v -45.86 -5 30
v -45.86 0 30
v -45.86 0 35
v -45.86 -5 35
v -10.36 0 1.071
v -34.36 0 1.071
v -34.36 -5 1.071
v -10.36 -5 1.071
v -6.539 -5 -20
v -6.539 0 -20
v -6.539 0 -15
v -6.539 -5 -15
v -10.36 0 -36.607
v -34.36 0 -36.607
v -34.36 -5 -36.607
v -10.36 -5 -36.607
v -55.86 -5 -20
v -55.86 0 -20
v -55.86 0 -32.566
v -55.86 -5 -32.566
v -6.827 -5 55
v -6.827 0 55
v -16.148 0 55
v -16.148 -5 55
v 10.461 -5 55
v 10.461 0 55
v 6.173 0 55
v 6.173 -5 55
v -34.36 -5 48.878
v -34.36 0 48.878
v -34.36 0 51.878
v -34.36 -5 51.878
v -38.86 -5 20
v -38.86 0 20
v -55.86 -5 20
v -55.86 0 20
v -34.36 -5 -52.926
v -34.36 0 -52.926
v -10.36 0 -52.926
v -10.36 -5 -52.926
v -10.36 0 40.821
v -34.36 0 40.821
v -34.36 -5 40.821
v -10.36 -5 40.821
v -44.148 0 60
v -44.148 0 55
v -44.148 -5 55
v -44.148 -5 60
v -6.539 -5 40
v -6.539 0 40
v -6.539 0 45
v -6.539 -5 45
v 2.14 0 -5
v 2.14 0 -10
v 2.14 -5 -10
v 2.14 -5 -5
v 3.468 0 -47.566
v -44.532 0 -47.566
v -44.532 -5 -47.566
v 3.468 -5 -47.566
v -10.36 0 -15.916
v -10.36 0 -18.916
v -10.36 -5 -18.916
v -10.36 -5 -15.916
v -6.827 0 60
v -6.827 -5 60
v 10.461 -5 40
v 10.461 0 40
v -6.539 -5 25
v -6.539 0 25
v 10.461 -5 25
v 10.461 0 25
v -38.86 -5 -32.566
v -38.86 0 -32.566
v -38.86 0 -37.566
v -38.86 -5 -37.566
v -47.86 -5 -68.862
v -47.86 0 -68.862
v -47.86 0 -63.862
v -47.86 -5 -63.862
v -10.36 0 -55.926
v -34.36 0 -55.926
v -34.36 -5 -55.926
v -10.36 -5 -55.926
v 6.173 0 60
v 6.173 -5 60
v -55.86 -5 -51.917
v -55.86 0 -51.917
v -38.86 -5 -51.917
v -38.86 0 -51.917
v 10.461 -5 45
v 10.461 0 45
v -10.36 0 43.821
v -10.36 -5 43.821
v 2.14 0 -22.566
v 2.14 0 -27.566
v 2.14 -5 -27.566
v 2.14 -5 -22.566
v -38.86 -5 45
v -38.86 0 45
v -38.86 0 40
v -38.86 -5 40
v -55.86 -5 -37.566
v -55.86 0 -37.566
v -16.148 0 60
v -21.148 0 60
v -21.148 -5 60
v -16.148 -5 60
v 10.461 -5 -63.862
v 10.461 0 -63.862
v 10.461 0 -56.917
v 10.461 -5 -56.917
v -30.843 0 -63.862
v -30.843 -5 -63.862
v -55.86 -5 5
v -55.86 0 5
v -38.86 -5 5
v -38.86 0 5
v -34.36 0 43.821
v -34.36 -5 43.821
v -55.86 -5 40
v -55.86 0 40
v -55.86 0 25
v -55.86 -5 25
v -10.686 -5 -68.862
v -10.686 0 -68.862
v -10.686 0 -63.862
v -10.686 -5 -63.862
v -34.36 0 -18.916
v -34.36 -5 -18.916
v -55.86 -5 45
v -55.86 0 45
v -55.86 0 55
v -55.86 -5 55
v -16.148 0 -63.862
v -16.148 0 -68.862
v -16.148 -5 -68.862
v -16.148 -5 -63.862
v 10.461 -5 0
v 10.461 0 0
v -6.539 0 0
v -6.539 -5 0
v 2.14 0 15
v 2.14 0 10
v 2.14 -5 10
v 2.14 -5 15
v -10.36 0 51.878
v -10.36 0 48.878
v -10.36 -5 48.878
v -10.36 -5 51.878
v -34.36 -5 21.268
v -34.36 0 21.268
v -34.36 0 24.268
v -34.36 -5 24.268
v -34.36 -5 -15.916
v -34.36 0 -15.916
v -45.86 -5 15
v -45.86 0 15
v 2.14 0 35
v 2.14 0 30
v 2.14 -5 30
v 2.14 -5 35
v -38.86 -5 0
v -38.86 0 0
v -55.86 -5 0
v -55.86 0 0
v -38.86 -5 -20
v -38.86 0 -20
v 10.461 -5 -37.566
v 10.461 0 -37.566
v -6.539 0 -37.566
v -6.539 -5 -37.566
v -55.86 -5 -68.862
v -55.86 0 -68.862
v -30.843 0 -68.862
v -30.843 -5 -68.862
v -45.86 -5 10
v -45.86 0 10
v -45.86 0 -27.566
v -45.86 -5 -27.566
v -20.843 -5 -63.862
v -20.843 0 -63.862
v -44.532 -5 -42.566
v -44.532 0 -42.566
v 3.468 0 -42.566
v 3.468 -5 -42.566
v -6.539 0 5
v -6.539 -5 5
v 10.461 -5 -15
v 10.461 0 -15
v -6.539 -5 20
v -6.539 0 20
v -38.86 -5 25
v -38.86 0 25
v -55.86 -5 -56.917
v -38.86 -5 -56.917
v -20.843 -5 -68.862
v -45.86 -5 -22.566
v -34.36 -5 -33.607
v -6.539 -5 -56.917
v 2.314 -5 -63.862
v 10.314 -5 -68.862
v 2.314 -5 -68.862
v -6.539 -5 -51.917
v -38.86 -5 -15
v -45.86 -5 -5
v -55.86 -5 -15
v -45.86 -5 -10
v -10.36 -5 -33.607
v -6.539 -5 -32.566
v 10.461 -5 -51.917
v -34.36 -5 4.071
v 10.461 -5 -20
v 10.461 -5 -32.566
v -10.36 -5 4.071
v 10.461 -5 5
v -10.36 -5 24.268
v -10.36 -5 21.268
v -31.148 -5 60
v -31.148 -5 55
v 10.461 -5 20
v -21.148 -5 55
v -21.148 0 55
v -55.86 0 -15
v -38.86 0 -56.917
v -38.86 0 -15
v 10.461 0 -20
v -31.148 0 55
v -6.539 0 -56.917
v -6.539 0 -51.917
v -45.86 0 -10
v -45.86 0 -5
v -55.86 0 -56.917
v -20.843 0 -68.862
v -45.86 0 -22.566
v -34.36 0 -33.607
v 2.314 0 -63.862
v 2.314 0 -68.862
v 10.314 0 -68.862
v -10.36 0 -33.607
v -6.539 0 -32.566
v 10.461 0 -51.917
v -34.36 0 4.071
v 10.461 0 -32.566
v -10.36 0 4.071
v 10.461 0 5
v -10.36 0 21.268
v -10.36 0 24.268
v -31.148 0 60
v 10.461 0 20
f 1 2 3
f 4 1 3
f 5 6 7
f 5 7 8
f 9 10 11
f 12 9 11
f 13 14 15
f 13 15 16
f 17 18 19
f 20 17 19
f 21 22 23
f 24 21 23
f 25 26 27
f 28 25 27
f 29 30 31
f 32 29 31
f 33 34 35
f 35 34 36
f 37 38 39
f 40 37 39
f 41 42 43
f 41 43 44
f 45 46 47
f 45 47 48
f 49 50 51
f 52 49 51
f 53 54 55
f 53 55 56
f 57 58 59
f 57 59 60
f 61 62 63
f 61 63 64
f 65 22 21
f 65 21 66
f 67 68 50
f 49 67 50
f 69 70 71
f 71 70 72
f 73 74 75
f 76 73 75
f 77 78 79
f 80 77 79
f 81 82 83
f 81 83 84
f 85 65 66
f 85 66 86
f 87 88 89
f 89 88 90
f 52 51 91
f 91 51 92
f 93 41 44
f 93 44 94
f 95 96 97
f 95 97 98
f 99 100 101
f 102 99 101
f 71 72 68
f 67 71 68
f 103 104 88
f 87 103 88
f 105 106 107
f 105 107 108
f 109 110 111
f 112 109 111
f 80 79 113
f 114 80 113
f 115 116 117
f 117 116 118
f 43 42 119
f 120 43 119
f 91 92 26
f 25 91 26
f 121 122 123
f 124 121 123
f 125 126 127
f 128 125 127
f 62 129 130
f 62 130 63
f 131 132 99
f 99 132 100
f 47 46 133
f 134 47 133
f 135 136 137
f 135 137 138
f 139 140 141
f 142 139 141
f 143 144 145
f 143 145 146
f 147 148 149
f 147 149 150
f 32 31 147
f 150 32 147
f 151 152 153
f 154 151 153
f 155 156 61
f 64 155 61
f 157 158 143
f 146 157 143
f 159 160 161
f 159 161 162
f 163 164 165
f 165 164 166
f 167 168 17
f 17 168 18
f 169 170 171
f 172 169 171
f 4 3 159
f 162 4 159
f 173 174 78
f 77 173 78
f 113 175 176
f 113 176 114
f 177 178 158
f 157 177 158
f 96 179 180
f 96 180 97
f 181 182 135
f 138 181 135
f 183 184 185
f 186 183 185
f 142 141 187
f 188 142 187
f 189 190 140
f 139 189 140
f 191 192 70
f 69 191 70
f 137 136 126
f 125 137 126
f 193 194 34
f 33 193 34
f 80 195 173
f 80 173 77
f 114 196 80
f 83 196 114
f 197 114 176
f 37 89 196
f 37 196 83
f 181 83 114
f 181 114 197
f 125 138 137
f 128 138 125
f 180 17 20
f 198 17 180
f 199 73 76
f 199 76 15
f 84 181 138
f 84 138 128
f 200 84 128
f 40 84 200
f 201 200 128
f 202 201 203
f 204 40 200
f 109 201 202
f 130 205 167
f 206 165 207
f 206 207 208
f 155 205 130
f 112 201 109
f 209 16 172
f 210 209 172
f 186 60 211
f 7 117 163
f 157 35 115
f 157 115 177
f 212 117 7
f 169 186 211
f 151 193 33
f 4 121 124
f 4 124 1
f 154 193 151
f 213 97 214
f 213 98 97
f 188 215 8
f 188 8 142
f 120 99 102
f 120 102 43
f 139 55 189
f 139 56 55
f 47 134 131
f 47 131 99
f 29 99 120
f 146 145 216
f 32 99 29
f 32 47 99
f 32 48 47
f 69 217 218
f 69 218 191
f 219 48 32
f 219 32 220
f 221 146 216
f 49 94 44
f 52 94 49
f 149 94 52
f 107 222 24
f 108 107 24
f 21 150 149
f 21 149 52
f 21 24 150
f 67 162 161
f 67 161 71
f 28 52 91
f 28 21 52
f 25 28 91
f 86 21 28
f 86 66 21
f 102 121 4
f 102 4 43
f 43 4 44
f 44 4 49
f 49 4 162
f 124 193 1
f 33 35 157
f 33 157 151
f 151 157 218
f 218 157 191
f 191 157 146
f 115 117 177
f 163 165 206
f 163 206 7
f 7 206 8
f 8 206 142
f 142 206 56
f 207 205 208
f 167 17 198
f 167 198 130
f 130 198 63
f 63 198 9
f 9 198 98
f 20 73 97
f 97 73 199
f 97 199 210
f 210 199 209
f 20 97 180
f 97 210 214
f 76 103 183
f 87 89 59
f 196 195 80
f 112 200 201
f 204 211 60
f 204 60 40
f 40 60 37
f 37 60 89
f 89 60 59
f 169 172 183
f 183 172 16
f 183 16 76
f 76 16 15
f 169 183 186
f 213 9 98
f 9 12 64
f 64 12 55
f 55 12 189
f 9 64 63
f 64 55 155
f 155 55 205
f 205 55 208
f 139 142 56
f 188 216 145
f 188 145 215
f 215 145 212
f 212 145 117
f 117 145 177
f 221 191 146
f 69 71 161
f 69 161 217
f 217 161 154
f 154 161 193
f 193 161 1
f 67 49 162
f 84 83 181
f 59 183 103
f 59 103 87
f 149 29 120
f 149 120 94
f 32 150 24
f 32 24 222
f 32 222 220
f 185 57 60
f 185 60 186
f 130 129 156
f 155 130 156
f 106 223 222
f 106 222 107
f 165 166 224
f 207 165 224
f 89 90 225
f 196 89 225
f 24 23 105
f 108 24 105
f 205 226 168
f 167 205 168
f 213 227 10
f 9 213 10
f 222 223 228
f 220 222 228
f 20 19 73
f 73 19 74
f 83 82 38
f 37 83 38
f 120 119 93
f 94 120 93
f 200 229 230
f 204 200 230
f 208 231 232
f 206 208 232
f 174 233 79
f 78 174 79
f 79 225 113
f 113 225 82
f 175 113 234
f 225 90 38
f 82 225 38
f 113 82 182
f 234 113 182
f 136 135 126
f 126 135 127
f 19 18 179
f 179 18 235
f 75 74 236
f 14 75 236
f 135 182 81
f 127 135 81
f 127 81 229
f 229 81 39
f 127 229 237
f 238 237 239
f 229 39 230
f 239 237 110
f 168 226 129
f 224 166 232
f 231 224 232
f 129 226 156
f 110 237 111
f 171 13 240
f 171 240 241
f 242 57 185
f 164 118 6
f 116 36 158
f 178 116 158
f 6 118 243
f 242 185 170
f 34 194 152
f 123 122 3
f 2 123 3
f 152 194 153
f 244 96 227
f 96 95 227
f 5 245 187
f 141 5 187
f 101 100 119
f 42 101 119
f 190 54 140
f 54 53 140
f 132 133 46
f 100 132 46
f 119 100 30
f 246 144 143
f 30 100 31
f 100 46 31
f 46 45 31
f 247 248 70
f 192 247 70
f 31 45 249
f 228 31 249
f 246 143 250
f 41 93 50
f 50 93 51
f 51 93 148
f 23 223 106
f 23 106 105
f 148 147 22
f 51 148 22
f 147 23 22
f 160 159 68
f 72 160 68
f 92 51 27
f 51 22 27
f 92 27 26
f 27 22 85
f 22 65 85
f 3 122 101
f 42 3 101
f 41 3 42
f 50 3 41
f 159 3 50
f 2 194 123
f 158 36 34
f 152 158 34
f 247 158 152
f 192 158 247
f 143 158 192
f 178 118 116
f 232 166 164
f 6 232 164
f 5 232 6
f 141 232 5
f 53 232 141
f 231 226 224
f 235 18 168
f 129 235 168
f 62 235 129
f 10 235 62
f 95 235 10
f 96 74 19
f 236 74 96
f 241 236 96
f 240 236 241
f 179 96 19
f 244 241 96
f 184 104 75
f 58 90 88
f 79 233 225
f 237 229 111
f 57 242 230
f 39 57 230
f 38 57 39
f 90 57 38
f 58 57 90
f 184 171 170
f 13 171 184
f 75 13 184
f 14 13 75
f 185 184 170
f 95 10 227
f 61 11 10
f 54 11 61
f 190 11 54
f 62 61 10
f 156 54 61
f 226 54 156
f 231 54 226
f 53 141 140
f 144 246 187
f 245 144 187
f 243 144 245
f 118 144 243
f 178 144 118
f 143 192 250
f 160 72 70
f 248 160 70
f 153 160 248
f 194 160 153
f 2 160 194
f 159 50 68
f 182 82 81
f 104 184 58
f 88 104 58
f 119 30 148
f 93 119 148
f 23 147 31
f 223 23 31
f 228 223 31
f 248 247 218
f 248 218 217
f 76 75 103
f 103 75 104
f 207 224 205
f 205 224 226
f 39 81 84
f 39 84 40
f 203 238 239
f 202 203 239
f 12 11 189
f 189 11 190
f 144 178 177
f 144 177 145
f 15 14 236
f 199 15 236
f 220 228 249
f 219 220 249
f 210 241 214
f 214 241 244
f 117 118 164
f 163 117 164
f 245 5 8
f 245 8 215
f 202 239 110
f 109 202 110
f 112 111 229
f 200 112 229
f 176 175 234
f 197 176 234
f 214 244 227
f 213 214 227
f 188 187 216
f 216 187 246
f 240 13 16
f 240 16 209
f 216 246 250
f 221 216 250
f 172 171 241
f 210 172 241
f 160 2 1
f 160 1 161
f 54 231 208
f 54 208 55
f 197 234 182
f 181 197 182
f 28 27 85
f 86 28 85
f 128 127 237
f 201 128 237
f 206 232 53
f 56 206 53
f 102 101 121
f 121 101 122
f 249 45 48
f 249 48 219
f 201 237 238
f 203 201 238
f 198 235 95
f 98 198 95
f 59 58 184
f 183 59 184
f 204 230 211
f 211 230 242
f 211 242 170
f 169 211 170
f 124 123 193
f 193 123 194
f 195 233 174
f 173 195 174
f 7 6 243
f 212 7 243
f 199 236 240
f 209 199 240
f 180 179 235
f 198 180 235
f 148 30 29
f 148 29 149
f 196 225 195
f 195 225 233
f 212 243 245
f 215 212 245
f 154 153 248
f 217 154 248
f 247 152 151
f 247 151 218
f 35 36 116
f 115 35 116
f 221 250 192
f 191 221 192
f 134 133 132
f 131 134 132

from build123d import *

# Parameters (mm, degrees)
F0_W     = 24
F0_H     = 3
F0_W_2   = 48
F0_H_2   = 5
F0_W_3   = 13
F0_W_4   = 5
F0_W_5   = 10
F0_W_6   = 5.462219
F0_W_7   = 8
F2_DEPTH = 5


with BuildPart() as f2:
    # F0 (on Front) → F2 (new body)
    with BuildSketch(Plane.XZ):
        Polygon((-44.148275, 55), (-55.860446, 55), (-55.860446, 45), (-38.860446, 45), (-38.860446, 40), (-55.860446, 40), (-55.860446, 25), (-38.860446, 25), (-38.860446, 20), (-55.860446, 20), (-55.860446, 5), (-38.860446, 5), (-38.860446, 0), (-55.860446, 0), (-55.860446, -15), (-38.860446, -15), (-38.860446, -20), (-55.860446, -20), (-55.860446, -32.565833), (-38.860446, -32.565833), (-38.860446, -37.565833), (-55.860446, -37.565833), (-55.860446, -51.917288), (-38.860446, -51.917288), (-38.860446, -56.917288), (-55.860446, -56.917288), (-55.860446, -63.862034), (-47.860446, -63.862034), (-30.842662, -63.862034), (-20.842662, -63.862034), (-16.148275, -63.862034), (-10.686056, -63.862034), (2.313944, -63.862034), (10.461201, -63.862034), (10.461201, -56.917288), (-6.538799, -56.917288), (-6.538799, -51.917288), (10.461201, -51.917288), (10.461201, -37.565833), (-6.538799, -37.565833), (-6.538799, -32.565833), (10.461201, -32.565833), (10.461201, -20), (-6.538799, -20), (-6.538799, -15), (10.461201, -15), (10.461201, 0), (-6.538799, 0), (-6.538799, 5), (10.461201, 5), (10.461201, 20), (-6.538799, 20), (-6.538799, 25), (10.461201, 25), (10.461201, 40), (-6.538799, 40), (-6.538799, 45), (10.461201, 45), (10.461201, 55), (6.173372, 55), (-6.826628, 55), (-16.148275, 55), (-21.148275, 55), (-31.148275, 55), align=None)
        with Locations((-22.360446, -54.425548)):
            Rectangle(F0_W, F0_H, mode=Mode.SUBTRACT)
        with Locations((-20.532146, -45.065833)):
            Rectangle(F0_W_2, F0_H_2, mode=Mode.SUBTRACT)
        with Locations((-22.360446, -35.106815)):
            Rectangle(F0_W, F0_H, mode=Mode.SUBTRACT)
        with Locations((-21.860446, -25.065833)):
            Rectangle(F0_W_2, F0_H_2, mode=Mode.SUBTRACT)
        with Locations((-22.360446, -17.415623)):
            Rectangle(F0_W, F0_H, mode=Mode.SUBTRACT)
        with Locations((-21.860446, -7.5)):
            Rectangle(F0_W_2, F0_H_2, mode=Mode.SUBTRACT)
        with Locations((-22.360446, 2.570768)):
            Rectangle(F0_W, F0_H, mode=Mode.SUBTRACT)
        with Locations((-21.860446, 12.5)):
            Rectangle(F0_W_2, F0_H_2, mode=Mode.SUBTRACT)
        with Locations((-22.360446, 22.768489)):
            Rectangle(F0_W, F0_H, mode=Mode.SUBTRACT)
        with Locations((-21.860446, 32.5)):
            Rectangle(F0_W_2, F0_H_2, mode=Mode.SUBTRACT)
        with Locations((-22.360446, 42.321008)):
            Rectangle(F0_W, F0_H, mode=Mode.SUBTRACT)
        with Locations((-22.360446, 50.378293)):
            Rectangle(F0_W, F0_H, mode=Mode.SUBTRACT)
        with Locations((-37.648275, 57.5)):
            Rectangle(F0_W_3, F0_H_2)
        with Locations((-18.648275, 57.5)):
            Rectangle(F0_W_4, F0_H_2)
        with Locations((-0.326628, 57.5)):
            Rectangle(F0_W_3, F0_H_2)
        with Locations((-25.842662, -66.362034)):
            Rectangle(F0_W_5, F0_H_2)
        with Locations((-13.417165, -66.362034)):
            Rectangle(F0_W_6, F0_H_2)
        Polygon((10.461201, -63.862034), (2.313944, -63.862034), (2.313944, -68.862034), (10.313944, -68.862034), align=None)
        with Locations((-51.860446, -66.362034)):
            Rectangle(F0_W_7, F0_H_2)
    extrude(amount=F2_DEPTH)


solid = f2.part
